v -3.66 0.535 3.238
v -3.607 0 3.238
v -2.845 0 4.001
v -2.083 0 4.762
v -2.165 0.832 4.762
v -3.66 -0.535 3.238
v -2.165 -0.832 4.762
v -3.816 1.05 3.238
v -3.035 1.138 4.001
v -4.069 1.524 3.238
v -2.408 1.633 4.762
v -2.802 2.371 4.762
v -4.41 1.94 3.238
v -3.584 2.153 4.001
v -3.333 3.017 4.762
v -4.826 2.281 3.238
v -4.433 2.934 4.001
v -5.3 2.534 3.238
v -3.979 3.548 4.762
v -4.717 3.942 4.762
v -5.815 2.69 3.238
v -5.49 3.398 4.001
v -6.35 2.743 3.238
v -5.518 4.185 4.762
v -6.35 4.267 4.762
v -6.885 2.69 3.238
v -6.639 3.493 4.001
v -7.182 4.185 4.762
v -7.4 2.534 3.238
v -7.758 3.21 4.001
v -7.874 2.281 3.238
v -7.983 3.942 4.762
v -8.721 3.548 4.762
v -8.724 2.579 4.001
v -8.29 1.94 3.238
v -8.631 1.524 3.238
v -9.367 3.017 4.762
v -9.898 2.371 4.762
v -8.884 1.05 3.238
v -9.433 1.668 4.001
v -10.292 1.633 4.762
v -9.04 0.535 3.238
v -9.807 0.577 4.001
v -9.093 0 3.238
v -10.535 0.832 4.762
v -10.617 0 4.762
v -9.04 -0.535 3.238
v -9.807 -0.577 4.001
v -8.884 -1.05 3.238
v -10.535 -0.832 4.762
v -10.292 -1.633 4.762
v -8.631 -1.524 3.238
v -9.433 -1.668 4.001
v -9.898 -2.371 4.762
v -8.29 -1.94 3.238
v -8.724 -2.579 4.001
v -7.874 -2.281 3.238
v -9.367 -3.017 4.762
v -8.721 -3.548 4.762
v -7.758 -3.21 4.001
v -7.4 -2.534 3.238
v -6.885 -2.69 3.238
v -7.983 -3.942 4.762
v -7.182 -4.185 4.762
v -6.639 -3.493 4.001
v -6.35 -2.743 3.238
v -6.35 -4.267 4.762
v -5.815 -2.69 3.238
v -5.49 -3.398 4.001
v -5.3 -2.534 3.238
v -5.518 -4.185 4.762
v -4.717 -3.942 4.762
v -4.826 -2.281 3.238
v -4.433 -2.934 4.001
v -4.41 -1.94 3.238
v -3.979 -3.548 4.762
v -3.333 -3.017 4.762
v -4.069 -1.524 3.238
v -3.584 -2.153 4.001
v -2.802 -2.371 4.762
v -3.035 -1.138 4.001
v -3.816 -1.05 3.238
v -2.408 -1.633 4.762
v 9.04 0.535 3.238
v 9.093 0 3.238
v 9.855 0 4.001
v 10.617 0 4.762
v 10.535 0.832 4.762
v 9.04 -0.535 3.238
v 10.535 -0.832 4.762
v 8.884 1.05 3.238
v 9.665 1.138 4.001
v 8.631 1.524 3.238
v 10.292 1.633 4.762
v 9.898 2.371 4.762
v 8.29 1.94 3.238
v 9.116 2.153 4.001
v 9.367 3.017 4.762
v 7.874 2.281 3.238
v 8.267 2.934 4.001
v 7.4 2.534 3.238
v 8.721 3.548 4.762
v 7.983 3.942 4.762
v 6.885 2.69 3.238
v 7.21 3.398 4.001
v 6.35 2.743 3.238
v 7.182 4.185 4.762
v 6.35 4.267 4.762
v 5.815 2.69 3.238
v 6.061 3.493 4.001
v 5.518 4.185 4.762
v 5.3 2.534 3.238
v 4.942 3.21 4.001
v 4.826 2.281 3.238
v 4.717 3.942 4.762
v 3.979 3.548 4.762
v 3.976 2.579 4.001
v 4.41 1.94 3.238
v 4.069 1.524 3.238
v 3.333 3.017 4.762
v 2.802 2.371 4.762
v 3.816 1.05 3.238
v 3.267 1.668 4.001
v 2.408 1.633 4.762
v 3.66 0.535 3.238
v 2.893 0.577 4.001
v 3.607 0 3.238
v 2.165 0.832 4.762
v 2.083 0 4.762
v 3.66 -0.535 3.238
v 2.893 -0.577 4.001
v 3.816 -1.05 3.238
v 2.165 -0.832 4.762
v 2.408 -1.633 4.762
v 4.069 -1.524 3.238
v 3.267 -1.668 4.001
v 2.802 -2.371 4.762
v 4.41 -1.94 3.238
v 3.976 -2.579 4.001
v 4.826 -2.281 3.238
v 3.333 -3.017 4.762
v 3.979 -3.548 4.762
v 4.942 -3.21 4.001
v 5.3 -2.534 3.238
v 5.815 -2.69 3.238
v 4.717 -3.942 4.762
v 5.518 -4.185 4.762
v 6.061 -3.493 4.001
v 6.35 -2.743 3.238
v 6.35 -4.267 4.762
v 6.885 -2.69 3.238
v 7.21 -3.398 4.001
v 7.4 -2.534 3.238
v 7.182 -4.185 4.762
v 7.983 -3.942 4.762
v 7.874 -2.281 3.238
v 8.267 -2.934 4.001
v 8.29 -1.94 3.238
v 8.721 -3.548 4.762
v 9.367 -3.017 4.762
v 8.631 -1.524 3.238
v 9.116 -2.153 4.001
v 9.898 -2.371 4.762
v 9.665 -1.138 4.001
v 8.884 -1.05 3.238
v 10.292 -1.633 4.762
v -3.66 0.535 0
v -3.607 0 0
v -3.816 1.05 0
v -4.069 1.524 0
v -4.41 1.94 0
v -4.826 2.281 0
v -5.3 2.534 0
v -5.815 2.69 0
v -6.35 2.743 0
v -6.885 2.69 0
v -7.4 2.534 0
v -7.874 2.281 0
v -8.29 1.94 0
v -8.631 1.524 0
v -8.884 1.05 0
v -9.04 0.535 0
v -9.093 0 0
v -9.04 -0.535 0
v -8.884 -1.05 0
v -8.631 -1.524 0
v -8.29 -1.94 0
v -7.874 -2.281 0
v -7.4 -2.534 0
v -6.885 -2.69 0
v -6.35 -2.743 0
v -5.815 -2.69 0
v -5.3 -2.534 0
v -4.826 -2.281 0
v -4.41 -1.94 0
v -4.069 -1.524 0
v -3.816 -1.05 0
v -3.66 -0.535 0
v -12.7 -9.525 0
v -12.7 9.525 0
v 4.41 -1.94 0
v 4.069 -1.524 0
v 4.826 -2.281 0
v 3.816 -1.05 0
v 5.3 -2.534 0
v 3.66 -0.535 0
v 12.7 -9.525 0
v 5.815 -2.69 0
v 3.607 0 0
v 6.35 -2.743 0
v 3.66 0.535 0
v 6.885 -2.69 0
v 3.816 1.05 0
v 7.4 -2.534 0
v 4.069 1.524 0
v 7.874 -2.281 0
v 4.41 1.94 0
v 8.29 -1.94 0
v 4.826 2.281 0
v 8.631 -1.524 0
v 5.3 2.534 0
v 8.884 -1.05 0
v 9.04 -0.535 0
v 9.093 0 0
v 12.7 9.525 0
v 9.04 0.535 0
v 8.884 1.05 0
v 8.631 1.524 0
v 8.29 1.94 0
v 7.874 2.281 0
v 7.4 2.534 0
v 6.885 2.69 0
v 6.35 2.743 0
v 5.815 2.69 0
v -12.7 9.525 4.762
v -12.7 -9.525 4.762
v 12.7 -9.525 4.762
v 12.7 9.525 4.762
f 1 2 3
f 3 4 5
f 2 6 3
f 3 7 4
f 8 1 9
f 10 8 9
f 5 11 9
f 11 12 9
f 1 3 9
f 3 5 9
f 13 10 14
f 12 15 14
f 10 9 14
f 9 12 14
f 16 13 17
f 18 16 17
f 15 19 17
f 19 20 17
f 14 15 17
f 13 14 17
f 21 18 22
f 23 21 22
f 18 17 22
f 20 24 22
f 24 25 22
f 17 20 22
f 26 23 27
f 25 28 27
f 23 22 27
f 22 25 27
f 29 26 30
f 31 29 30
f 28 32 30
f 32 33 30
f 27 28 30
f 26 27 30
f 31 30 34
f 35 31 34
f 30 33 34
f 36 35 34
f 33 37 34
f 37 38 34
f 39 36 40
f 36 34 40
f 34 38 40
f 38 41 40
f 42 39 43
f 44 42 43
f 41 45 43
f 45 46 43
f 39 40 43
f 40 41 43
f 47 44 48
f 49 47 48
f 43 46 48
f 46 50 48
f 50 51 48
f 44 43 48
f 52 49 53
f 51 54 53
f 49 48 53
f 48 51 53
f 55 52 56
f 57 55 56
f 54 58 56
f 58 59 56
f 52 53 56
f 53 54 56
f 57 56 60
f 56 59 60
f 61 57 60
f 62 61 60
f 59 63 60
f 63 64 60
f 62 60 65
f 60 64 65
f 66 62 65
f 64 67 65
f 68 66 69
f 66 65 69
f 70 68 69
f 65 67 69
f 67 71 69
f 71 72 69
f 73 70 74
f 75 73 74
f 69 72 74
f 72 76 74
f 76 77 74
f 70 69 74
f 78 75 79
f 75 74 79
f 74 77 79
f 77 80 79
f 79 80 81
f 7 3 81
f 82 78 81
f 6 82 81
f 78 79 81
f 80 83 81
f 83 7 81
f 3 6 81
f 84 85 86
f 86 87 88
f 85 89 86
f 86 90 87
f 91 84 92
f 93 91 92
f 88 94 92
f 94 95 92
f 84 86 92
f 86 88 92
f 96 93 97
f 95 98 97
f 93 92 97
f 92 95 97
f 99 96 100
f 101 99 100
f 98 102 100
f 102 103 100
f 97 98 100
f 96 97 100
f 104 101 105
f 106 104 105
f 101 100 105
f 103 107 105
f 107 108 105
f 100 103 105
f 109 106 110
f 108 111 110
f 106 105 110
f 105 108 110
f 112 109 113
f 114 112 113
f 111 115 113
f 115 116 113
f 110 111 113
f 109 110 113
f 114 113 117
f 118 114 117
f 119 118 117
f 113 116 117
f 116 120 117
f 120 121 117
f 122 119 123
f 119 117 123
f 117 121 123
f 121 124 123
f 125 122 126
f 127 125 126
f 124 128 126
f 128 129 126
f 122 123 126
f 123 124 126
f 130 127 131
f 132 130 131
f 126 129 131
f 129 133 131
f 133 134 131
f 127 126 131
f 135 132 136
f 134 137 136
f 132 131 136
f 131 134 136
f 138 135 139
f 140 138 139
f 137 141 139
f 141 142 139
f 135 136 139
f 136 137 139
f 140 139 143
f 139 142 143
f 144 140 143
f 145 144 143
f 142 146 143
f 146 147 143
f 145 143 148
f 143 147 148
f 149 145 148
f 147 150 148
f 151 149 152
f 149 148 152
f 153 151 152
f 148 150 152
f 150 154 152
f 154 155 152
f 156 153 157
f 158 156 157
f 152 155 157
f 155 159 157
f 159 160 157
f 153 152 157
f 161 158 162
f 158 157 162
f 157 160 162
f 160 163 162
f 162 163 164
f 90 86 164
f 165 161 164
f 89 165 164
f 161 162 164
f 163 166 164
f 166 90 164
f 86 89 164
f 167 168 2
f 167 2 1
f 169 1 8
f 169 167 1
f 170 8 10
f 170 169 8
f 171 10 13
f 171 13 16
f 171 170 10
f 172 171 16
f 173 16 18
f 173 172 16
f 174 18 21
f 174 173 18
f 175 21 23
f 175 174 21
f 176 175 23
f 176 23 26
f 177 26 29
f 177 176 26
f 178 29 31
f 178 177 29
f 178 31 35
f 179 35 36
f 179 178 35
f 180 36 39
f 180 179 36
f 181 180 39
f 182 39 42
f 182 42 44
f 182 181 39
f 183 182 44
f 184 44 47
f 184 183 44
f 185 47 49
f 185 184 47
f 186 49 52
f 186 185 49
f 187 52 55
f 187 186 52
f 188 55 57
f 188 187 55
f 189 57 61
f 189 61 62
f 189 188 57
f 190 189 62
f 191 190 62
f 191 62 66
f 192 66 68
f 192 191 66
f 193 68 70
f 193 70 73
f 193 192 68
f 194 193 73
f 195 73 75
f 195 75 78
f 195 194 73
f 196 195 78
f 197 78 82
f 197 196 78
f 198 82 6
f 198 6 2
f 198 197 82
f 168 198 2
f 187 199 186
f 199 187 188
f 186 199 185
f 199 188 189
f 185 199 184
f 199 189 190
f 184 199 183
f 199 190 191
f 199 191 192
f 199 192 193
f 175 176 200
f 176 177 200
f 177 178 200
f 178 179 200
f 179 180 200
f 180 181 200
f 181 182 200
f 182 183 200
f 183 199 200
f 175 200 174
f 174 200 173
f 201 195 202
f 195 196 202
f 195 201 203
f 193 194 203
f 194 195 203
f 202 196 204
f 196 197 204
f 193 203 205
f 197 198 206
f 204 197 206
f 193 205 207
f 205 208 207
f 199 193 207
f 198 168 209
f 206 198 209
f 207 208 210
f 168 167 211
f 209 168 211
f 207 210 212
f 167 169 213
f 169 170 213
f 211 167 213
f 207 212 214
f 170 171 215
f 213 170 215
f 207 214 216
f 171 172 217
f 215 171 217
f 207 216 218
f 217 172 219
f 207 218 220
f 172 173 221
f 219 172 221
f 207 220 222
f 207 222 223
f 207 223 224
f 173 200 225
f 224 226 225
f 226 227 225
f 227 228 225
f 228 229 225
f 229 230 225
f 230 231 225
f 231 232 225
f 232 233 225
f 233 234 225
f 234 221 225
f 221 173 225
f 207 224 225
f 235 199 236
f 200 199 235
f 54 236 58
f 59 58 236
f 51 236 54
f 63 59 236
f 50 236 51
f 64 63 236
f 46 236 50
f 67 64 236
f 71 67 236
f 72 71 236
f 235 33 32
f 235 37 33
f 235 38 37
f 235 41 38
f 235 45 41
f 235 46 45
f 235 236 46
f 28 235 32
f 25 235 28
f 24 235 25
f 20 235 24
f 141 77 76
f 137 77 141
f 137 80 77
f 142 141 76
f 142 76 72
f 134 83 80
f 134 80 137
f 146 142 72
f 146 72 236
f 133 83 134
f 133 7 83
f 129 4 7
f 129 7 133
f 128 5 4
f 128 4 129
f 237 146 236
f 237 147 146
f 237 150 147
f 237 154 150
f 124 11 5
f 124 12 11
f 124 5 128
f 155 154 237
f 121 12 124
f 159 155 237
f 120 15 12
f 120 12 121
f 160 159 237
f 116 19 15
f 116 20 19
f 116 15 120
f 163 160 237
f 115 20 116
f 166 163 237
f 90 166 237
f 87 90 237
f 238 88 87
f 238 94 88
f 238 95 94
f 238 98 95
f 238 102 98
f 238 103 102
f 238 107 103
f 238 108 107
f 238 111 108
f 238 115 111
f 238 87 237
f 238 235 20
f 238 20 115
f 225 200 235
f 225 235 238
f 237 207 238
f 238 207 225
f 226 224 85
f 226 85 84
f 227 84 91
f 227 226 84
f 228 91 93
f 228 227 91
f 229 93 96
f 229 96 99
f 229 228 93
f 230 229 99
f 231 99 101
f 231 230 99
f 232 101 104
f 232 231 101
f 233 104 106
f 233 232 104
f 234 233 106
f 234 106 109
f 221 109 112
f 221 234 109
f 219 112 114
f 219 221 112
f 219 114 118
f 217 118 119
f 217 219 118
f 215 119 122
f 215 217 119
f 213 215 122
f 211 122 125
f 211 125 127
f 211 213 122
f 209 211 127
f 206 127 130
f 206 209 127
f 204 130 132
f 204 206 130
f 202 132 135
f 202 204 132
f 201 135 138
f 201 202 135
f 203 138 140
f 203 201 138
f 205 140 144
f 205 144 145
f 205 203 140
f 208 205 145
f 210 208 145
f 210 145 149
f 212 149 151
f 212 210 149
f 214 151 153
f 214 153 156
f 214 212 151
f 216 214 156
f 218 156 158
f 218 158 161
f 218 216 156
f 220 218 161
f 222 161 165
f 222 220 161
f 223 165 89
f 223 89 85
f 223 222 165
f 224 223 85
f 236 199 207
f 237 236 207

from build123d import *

# Parameters (mm, degrees)
F0_W     = 25.4
F0_H     = 19.05
F0_R     = 2.7432
F1_DEPTH = 4.7625
F2_SIZE  = 1.524


with BuildPart() as f1:
    # F0 (on Top) → F1 (new body)
    with BuildSketch(Plane.XY):
        Rectangle(F0_W, F0_H)
        with Locations((-6.35, 0)):
            Circle(F0_R, mode=Mode.SUBTRACT)
        with Locations((6.35, 0)):
            Circle(F0_R, mode=Mode.SUBTRACT)
    extrude(amount=F1_DEPTH)

    # F2
    f2_edges = [f1.edges().sort_by_distance(p)[0] for p in [
        (-9.0932, 0, 4.7625),
        (3.6068, 0, 4.7625),
    ]]
    chamfer(f2_edges, length=F2_SIZE)


solid = f1.part
